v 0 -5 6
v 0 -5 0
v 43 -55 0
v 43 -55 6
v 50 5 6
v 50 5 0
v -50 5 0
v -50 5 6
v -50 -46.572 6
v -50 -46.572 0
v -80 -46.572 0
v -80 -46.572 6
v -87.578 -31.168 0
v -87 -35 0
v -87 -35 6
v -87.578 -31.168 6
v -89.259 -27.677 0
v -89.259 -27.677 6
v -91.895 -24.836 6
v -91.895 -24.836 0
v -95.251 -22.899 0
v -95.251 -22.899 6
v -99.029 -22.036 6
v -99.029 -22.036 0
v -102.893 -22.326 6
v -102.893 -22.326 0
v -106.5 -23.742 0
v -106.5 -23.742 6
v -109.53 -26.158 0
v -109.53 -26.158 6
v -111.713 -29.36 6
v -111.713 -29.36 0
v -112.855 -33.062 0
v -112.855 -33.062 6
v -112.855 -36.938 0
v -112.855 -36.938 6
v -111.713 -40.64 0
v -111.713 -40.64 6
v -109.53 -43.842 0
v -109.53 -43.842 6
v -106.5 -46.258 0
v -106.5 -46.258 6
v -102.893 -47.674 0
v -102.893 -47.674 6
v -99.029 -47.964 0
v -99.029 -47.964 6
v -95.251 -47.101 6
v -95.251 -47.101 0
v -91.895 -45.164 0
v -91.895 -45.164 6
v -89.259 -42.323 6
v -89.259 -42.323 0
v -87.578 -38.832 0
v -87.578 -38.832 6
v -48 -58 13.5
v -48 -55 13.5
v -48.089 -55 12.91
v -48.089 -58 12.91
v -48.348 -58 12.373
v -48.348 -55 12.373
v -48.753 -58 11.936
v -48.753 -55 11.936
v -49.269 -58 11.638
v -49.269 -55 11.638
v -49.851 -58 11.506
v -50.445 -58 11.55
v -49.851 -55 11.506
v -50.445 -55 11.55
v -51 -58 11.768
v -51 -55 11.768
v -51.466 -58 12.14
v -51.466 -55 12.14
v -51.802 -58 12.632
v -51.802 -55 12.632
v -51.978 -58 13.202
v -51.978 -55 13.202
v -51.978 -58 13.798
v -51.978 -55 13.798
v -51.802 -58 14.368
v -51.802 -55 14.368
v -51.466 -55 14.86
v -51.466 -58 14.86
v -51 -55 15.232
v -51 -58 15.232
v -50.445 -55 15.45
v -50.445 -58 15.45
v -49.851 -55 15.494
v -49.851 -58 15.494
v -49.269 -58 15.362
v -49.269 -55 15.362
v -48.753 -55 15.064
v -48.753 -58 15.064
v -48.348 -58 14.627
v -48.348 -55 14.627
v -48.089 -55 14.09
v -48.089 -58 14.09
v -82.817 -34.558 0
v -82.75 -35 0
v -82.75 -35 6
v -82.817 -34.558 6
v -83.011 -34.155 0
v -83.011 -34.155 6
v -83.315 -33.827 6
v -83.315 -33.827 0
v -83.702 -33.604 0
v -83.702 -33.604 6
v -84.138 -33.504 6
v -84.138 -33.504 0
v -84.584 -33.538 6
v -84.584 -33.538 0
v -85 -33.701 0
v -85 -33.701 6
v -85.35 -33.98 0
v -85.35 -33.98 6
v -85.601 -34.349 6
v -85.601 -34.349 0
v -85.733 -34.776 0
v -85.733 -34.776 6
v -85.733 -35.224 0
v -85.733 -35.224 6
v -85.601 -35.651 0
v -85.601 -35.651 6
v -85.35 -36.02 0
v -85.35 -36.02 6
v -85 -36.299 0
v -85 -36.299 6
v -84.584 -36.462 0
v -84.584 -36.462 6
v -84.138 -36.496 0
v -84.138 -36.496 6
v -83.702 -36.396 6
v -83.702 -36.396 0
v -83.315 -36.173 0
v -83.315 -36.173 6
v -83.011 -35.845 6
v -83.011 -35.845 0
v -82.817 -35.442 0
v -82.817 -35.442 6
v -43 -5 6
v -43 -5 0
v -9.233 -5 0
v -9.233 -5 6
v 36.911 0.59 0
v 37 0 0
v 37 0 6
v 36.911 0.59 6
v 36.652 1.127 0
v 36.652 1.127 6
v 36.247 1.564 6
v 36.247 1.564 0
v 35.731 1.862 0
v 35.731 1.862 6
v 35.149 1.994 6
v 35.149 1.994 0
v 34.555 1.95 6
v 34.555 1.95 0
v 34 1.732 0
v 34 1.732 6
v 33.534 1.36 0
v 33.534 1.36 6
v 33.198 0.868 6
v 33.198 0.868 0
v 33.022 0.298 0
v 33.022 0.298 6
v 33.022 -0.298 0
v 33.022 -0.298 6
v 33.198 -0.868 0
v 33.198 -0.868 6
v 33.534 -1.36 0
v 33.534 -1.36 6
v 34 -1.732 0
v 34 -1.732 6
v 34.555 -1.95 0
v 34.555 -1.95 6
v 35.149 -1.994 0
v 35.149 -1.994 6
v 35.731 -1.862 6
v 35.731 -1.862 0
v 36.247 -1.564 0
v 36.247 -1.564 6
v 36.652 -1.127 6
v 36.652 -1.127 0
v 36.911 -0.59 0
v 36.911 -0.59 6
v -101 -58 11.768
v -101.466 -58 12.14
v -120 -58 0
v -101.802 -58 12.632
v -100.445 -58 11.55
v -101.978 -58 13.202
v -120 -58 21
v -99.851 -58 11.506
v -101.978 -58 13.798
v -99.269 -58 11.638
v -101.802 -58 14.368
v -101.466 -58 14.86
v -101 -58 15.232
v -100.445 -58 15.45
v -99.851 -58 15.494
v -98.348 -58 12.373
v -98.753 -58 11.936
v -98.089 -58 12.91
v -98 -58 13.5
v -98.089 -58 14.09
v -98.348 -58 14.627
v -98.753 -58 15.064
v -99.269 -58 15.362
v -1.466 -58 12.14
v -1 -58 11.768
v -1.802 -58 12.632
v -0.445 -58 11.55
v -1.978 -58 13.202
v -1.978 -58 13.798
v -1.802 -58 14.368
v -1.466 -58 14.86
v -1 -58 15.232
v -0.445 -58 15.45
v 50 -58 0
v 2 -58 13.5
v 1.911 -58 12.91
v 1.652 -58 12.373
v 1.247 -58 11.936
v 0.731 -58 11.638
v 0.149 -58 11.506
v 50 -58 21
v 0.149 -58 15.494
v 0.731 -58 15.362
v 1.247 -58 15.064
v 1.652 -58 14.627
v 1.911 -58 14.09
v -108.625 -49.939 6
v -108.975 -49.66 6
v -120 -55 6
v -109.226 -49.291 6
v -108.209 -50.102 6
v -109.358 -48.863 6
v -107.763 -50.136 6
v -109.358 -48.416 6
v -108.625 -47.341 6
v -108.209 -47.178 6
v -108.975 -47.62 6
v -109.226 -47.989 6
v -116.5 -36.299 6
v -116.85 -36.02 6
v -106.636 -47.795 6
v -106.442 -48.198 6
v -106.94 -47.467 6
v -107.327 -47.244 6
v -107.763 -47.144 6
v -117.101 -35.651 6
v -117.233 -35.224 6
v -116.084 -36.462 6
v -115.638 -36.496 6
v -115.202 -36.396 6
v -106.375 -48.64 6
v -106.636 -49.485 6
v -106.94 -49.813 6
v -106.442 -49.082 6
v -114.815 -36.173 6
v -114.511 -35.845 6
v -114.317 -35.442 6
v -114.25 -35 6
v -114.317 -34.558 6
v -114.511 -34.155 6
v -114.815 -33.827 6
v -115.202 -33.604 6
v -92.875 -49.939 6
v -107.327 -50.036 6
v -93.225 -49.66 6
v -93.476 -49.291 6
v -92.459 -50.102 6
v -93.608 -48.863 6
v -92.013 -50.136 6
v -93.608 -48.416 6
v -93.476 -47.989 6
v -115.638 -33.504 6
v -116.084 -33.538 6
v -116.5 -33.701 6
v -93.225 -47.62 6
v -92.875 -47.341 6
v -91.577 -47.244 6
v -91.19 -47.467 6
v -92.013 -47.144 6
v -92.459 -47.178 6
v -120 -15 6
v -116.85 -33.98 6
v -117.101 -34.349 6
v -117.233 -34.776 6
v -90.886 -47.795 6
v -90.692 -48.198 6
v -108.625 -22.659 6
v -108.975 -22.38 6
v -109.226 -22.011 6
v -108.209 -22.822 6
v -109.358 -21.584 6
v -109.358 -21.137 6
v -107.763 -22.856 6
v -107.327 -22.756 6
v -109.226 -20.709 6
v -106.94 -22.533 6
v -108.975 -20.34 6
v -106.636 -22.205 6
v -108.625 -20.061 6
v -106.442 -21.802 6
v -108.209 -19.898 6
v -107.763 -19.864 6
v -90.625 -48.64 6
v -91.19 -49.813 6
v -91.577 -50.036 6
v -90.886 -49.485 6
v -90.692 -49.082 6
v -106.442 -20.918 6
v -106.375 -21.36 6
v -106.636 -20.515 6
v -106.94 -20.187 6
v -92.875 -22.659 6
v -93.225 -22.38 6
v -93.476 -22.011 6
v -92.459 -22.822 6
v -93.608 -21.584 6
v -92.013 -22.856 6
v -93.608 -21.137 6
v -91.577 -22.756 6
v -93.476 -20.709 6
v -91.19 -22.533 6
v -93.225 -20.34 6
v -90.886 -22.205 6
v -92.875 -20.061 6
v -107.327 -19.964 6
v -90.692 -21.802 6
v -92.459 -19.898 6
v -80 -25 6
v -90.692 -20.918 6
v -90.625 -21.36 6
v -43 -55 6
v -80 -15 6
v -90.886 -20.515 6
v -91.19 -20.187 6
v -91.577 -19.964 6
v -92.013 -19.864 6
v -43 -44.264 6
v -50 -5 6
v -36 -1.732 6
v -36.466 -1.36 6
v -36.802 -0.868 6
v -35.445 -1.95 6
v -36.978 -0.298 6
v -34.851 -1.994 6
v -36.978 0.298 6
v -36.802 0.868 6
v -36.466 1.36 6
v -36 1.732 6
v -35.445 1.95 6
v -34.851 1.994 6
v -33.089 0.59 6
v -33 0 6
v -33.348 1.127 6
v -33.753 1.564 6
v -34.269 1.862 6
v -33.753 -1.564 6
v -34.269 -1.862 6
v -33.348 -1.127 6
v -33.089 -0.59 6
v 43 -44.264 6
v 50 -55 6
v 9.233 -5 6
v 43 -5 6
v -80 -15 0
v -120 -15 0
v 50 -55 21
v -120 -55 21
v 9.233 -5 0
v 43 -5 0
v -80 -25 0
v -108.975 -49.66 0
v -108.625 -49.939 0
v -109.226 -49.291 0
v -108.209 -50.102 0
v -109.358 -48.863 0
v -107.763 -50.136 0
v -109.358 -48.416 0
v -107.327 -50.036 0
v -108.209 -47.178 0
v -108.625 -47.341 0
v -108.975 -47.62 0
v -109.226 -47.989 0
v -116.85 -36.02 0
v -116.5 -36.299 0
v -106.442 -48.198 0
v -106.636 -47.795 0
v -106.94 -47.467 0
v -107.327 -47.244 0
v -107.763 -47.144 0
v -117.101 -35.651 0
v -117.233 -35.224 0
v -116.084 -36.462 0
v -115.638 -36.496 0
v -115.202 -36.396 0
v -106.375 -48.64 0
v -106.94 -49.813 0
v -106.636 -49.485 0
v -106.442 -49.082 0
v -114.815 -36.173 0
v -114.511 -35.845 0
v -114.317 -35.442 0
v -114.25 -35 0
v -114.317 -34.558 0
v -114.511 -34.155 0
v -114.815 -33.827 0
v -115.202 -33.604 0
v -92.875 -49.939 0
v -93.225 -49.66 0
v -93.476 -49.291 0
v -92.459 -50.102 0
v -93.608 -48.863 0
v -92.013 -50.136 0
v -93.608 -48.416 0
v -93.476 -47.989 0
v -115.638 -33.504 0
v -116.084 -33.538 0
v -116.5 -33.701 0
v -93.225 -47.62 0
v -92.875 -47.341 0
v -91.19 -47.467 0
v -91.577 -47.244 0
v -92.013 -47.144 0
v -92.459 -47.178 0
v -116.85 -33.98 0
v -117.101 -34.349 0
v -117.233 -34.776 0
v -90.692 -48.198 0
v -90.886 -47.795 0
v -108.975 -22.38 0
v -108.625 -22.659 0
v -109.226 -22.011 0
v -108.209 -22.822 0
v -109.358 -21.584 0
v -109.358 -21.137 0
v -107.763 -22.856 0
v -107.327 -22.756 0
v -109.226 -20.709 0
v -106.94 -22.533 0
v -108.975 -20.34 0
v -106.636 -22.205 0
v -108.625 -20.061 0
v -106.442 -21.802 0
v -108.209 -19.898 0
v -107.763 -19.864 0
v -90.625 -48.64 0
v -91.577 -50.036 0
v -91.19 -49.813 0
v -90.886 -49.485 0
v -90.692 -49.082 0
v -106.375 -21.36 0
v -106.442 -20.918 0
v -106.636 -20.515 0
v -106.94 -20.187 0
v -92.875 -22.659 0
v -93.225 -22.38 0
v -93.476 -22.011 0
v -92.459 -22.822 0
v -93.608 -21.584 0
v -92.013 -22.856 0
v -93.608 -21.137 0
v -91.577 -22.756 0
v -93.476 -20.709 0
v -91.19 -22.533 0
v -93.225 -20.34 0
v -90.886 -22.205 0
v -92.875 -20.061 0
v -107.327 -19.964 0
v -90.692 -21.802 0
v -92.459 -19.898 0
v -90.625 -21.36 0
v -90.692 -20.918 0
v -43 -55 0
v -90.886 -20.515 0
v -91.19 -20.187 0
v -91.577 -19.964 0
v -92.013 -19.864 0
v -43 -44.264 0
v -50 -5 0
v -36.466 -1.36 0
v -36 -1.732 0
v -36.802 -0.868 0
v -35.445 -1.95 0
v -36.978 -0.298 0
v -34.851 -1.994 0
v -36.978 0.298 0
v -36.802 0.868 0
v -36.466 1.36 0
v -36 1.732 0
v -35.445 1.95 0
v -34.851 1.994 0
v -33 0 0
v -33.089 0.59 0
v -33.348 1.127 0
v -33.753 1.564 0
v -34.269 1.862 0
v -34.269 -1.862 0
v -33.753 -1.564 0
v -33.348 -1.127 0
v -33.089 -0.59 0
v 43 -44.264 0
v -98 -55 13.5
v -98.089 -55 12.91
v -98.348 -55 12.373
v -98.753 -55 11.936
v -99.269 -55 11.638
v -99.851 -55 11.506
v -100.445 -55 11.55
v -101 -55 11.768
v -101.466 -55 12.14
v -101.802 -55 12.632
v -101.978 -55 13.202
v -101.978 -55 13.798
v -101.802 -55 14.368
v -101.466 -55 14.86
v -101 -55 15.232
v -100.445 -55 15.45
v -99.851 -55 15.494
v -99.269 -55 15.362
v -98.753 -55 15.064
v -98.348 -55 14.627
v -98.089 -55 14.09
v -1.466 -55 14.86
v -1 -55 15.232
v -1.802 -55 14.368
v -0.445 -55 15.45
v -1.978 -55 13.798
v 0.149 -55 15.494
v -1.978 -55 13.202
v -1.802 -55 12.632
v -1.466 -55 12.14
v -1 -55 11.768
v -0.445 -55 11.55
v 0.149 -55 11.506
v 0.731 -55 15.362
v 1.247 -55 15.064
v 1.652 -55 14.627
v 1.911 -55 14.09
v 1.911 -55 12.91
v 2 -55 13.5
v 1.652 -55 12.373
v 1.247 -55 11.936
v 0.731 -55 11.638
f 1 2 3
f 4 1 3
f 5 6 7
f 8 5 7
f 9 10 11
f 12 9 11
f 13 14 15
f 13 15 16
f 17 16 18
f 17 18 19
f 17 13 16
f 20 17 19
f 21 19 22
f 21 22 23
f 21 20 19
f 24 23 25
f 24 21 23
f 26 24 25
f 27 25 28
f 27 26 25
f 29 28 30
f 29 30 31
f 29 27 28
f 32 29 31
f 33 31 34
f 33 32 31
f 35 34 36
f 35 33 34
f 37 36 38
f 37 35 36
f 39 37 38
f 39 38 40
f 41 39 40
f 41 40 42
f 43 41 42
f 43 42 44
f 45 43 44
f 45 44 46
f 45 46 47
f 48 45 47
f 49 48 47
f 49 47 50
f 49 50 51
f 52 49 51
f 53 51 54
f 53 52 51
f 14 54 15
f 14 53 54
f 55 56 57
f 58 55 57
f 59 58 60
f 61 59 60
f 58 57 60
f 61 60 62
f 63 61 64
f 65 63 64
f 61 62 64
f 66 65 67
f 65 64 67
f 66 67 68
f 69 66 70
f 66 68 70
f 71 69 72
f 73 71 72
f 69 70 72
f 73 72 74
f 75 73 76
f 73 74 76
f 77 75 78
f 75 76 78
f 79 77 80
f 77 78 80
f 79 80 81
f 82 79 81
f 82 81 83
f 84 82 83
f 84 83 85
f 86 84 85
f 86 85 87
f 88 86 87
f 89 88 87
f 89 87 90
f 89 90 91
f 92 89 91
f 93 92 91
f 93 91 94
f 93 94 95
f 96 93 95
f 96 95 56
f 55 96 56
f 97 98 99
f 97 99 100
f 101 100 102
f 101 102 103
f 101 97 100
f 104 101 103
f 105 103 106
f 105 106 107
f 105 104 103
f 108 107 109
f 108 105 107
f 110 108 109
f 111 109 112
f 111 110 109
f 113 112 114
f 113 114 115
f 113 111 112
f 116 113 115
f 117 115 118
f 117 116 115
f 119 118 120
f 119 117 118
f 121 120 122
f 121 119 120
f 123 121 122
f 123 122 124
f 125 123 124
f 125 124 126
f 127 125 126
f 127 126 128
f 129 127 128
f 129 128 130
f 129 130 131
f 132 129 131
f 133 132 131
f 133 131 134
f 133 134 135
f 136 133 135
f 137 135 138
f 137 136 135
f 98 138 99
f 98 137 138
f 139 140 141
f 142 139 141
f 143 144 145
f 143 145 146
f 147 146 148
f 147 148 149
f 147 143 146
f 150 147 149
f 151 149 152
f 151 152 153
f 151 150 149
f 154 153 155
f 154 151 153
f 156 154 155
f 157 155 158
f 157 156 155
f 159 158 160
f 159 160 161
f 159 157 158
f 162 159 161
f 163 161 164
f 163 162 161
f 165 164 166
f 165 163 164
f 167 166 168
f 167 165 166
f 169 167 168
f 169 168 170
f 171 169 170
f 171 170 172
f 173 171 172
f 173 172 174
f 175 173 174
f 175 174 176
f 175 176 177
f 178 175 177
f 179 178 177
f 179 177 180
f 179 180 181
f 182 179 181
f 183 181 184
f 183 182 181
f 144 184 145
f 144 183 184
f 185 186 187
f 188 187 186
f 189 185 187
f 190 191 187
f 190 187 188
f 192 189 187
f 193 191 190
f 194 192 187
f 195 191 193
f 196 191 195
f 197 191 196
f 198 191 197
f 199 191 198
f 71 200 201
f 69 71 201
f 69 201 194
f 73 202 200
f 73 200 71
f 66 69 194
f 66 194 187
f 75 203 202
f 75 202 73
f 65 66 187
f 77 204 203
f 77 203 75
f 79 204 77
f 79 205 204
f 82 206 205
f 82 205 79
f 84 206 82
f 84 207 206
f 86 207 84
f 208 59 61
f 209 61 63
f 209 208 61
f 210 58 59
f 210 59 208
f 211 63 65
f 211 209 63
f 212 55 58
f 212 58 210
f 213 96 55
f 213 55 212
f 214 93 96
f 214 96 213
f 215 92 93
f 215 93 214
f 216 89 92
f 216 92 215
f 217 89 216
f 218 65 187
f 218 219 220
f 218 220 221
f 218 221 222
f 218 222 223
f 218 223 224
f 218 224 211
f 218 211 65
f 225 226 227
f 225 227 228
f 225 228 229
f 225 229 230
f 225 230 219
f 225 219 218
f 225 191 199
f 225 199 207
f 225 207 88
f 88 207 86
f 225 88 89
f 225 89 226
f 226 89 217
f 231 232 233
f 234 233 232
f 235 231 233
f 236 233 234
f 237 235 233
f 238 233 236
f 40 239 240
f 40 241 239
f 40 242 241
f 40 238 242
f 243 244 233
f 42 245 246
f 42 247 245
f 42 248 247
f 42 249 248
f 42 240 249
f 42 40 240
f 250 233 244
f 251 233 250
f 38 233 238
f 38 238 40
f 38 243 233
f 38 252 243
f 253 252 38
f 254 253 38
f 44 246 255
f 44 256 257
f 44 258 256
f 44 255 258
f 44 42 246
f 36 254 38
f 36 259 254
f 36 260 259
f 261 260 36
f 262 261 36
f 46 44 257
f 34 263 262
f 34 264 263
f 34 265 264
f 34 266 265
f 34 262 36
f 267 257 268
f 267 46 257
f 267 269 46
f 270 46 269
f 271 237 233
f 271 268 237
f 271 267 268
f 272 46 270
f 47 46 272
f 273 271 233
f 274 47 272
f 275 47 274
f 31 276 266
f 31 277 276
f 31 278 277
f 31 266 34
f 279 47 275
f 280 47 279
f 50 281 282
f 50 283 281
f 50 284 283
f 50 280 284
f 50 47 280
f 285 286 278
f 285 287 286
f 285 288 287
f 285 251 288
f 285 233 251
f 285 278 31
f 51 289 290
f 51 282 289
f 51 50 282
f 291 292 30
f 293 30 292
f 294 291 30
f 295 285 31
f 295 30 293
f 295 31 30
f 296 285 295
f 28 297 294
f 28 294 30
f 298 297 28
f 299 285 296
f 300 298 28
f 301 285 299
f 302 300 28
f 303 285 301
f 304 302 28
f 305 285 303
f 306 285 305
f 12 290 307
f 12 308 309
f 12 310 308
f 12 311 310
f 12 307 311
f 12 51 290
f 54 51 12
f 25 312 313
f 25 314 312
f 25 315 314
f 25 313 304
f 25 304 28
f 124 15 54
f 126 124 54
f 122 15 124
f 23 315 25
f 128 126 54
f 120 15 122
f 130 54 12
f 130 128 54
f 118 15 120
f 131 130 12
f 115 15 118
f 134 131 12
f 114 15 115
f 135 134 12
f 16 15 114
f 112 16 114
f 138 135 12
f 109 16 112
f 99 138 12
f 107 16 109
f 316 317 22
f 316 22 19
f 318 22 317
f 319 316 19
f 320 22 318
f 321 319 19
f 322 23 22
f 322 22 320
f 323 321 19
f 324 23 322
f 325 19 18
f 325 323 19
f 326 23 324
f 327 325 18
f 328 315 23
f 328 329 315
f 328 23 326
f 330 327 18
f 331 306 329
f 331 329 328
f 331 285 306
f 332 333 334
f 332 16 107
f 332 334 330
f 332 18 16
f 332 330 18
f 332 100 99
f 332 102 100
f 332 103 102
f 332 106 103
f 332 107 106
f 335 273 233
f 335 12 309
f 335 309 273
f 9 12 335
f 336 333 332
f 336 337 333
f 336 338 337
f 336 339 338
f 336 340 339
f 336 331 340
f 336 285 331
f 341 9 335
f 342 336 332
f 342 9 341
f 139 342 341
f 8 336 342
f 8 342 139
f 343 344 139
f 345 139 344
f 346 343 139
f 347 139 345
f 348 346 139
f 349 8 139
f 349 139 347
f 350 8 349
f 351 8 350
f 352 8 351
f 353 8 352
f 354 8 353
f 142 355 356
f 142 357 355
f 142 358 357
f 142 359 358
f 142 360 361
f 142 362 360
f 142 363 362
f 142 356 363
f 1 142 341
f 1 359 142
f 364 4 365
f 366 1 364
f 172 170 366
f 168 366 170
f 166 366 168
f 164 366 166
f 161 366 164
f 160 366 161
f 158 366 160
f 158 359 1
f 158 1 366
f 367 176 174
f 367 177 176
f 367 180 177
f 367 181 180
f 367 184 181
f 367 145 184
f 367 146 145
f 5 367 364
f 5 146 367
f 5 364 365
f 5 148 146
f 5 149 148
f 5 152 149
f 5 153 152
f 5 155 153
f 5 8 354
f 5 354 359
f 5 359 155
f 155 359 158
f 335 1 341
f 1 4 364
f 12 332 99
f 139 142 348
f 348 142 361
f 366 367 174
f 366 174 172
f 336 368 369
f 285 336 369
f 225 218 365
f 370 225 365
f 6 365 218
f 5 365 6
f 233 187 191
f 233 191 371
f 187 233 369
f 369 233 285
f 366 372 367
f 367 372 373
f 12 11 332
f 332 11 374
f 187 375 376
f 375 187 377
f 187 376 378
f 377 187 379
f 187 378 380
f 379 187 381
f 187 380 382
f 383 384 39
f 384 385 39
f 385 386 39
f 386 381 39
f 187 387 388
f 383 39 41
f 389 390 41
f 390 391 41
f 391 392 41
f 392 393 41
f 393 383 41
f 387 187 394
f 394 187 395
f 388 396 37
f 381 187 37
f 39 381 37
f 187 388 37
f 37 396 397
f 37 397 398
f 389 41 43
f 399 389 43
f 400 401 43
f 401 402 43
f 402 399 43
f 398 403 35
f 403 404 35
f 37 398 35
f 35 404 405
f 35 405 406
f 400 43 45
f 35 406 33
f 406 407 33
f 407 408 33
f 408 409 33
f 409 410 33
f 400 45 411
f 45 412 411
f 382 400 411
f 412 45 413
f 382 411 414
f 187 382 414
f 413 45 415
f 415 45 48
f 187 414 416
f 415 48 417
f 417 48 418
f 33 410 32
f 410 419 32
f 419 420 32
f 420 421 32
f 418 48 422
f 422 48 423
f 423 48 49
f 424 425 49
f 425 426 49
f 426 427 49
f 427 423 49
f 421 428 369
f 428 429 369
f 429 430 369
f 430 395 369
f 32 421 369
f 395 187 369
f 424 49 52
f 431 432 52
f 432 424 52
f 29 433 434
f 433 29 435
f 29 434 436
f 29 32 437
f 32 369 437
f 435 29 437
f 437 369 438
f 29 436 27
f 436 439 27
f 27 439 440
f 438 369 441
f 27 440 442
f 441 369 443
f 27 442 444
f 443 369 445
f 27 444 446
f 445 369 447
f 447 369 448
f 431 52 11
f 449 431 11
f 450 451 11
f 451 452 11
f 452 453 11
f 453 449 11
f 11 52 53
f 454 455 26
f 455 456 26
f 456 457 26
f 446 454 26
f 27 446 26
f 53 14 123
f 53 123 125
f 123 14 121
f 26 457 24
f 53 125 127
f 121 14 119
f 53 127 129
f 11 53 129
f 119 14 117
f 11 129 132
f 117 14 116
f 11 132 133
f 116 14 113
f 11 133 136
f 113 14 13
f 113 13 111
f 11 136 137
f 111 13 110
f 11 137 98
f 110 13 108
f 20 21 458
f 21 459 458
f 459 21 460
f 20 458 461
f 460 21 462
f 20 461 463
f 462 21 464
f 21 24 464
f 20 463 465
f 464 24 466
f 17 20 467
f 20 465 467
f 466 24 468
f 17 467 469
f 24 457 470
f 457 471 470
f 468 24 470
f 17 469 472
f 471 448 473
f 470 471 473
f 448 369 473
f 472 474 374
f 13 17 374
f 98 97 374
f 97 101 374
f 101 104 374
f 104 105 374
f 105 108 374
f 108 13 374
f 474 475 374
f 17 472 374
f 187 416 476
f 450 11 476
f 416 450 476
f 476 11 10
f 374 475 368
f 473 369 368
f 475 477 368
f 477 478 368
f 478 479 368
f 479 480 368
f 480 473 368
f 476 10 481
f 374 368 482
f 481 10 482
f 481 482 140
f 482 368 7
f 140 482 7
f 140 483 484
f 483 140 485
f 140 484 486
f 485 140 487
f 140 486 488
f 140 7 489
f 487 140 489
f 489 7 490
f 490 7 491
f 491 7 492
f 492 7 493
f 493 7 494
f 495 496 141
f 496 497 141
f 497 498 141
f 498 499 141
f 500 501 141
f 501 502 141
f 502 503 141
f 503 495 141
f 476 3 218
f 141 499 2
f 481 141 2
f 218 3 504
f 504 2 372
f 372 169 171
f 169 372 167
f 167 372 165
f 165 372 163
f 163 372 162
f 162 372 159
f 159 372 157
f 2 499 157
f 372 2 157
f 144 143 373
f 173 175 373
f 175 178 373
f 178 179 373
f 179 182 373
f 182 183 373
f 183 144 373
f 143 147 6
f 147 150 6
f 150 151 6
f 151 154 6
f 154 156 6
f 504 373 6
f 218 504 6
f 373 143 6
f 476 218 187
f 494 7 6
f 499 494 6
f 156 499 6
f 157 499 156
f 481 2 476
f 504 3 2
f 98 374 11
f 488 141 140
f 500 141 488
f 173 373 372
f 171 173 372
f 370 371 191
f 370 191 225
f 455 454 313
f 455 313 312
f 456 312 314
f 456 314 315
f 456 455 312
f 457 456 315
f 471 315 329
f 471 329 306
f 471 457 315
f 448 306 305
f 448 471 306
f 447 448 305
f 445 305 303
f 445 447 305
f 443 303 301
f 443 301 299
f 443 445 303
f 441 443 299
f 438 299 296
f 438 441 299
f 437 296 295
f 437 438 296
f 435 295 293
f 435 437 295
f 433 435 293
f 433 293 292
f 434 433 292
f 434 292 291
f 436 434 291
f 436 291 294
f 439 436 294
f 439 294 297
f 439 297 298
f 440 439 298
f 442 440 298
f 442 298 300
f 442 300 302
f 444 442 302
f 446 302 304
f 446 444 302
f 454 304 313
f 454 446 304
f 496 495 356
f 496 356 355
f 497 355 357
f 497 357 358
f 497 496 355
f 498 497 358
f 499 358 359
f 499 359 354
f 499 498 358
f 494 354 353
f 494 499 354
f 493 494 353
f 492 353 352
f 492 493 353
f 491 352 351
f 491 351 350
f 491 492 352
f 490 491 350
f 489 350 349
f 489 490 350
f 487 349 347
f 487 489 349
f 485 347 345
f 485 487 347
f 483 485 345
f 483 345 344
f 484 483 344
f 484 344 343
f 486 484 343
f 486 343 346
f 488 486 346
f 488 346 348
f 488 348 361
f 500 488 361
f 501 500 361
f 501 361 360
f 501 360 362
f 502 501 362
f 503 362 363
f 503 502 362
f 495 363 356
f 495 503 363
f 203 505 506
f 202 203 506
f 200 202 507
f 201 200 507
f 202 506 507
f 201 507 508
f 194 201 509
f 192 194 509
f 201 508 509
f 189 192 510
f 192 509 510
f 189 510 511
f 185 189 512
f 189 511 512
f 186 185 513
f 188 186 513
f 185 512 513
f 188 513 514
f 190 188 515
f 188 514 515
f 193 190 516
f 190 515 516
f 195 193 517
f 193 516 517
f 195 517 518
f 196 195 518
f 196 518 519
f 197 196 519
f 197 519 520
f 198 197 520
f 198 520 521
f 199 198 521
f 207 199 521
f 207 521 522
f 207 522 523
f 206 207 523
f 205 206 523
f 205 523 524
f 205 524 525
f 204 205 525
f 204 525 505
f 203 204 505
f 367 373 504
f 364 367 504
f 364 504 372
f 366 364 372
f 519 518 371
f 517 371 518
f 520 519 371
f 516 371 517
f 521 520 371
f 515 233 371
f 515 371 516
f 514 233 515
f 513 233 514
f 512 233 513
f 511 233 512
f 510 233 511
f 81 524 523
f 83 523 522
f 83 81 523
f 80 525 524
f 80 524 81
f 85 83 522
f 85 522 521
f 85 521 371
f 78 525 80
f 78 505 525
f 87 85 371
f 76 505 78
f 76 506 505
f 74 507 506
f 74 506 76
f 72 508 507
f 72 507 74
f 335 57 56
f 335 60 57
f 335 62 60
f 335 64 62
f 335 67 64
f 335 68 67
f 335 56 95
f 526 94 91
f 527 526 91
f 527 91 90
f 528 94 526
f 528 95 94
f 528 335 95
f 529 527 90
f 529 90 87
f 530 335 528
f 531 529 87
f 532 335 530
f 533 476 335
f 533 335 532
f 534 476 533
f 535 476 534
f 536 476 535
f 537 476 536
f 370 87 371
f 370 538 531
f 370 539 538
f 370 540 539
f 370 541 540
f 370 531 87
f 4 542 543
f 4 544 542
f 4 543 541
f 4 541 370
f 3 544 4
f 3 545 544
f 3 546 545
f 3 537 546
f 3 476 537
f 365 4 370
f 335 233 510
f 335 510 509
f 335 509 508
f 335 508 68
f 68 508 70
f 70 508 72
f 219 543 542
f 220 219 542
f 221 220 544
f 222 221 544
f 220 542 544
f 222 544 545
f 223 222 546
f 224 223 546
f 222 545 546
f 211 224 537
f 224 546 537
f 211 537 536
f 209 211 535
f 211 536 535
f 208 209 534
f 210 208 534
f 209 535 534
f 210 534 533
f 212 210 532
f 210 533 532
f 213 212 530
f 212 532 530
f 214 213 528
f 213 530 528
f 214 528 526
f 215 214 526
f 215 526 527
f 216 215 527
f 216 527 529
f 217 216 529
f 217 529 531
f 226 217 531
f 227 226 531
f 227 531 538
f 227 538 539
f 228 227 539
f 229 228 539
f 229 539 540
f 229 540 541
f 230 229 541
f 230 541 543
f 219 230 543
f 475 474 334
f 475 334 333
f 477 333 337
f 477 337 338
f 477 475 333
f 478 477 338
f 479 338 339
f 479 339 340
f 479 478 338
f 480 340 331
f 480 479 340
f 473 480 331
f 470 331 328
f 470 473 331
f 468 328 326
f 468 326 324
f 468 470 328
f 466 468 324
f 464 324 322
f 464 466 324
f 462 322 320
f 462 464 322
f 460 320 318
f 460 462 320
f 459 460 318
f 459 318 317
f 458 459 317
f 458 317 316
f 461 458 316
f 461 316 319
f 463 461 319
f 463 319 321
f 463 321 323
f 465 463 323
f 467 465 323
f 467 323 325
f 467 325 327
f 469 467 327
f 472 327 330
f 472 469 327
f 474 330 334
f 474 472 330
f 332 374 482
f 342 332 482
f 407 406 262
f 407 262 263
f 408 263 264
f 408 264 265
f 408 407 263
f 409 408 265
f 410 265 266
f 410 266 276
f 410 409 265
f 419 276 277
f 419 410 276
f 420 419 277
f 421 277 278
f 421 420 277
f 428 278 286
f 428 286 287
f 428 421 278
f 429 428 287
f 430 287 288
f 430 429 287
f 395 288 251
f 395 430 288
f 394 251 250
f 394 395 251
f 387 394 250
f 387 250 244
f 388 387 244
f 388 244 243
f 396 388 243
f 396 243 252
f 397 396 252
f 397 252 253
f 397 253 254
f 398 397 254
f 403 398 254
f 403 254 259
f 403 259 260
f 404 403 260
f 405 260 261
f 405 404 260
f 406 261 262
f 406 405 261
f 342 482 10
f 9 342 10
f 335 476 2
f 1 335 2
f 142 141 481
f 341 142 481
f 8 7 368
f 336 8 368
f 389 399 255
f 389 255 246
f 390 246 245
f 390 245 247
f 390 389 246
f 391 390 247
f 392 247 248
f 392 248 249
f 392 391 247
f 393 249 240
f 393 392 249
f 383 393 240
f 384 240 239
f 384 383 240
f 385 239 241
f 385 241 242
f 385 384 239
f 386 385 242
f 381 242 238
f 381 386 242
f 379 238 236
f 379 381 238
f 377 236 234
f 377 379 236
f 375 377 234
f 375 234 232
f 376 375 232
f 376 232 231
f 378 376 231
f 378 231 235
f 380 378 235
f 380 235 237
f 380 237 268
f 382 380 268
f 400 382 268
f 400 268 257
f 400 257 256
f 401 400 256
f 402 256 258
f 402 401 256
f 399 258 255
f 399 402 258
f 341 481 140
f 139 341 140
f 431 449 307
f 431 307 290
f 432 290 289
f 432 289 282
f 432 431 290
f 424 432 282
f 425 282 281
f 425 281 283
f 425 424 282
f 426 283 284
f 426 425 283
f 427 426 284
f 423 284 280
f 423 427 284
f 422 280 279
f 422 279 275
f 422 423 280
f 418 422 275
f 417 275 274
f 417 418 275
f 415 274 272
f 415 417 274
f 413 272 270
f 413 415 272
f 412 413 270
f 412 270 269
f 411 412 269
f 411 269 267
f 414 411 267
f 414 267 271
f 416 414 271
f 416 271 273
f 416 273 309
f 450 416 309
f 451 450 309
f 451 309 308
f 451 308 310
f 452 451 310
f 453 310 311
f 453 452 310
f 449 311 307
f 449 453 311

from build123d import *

# Parameters (mm, degrees)
SKETCH1_R                = 1.5
SKETCH1_R_2              = 13
SKETCH1_R_3              = 2
BOSS_EXTRUDE1_DEPTH      = 6
SKETCH2_W                = 170
SKETCH2_H                = 3
BOSS_EXTRUDE2_DEPTH      = 15
BOSS_EXTRUDE2_DEPTH_BACK = 6
SKETCH3_R                = 2
CUT_EXTRUDE1_DEPTH       = 15


with BuildPart() as part:
    # Sketch1 → Boss-Extrude1 (new body)
    with BuildSketch(Plane.XY):
        Polygon((50, 5), (-50, 5), (-80, -15), (-120, -15), (-120, -55), (-43, -55), (0, -5), (43, -55), (50, -55), align=None)
        Polygon((43, -5), (43, -44.264450265), (9.232572773, -5), align=None, mode=Mode.SUBTRACT)
        with Locations((-107.875, -48.63990011)):
            Circle(SKETCH1_R, mode=Mode.SUBTRACT)
        with Locations((-92.125, -48.63990011)):
            Circle(SKETCH1_R, mode=Mode.SUBTRACT)
        with Locations((-115.75, -35)):
            Circle(SKETCH1_R, mode=Mode.SUBTRACT)
        with Locations((-100, -35)):
            Circle(SKETCH1_R_2, mode=Mode.SUBTRACT)
        with Locations((-84.25, -35)):
            Circle(SKETCH1_R, mode=Mode.SUBTRACT)
        Polygon((-80, -46.571581383), (-80, -25), (-50, -5), (-50, -46.571581383), align=None, mode=Mode.SUBTRACT)
        Polygon((-43, -44.264450265), (-43, -5), (-9.232572773, -5), align=None, mode=Mode.SUBTRACT)
        with Locations((-107.875, -21.36009989)):
            Circle(SKETCH1_R, mode=Mode.SUBTRACT)
        with Locations((-92.125, -21.36009989)):
            Circle(SKETCH1_R, mode=Mode.SUBTRACT)
        with Locations((-35, 0)):
            Circle(SKETCH1_R_3, mode=Mode.SUBTRACT)
        with Locations((35, 0)):
            Circle(SKETCH1_R_3, mode=Mode.SUBTRACT)
    extrude(amount=BOSS_EXTRUDE1_DEPTH)

    # Sketch2 → Boss-Extrude2 (add, two sides)
    with BuildSketch(Plane.XY.offset(6)) as boss_extrude2_sk:
        with Locations((-35, -56.5)):
            Rectangle(SKETCH2_W, SKETCH2_H)
    extrude(amount=BOSS_EXTRUDE2_DEPTH)
    extrude(boss_extrude2_sk.sketch, amount=-BOSS_EXTRUDE2_DEPTH_BACK)

    # Sketch3 → Cut-Extrude1 (cut)
    with BuildSketch(Plane(origin=(0, -55, 0), x_dir=(1, 0, 0), z_dir=(0, 1, 0))):
        with Locations((0, -13.5)):
            Circle(SKETCH3_R)
        with Locations((-50, -13.5)):
            Circle(SKETCH3_R)
        with Locations((-100, -13.5)):
            Circle(SKETCH3_R)
    extrude(amount=-CUT_EXTRUDE1_DEPTH, mode=Mode.SUBTRACT)


solid = part.part
